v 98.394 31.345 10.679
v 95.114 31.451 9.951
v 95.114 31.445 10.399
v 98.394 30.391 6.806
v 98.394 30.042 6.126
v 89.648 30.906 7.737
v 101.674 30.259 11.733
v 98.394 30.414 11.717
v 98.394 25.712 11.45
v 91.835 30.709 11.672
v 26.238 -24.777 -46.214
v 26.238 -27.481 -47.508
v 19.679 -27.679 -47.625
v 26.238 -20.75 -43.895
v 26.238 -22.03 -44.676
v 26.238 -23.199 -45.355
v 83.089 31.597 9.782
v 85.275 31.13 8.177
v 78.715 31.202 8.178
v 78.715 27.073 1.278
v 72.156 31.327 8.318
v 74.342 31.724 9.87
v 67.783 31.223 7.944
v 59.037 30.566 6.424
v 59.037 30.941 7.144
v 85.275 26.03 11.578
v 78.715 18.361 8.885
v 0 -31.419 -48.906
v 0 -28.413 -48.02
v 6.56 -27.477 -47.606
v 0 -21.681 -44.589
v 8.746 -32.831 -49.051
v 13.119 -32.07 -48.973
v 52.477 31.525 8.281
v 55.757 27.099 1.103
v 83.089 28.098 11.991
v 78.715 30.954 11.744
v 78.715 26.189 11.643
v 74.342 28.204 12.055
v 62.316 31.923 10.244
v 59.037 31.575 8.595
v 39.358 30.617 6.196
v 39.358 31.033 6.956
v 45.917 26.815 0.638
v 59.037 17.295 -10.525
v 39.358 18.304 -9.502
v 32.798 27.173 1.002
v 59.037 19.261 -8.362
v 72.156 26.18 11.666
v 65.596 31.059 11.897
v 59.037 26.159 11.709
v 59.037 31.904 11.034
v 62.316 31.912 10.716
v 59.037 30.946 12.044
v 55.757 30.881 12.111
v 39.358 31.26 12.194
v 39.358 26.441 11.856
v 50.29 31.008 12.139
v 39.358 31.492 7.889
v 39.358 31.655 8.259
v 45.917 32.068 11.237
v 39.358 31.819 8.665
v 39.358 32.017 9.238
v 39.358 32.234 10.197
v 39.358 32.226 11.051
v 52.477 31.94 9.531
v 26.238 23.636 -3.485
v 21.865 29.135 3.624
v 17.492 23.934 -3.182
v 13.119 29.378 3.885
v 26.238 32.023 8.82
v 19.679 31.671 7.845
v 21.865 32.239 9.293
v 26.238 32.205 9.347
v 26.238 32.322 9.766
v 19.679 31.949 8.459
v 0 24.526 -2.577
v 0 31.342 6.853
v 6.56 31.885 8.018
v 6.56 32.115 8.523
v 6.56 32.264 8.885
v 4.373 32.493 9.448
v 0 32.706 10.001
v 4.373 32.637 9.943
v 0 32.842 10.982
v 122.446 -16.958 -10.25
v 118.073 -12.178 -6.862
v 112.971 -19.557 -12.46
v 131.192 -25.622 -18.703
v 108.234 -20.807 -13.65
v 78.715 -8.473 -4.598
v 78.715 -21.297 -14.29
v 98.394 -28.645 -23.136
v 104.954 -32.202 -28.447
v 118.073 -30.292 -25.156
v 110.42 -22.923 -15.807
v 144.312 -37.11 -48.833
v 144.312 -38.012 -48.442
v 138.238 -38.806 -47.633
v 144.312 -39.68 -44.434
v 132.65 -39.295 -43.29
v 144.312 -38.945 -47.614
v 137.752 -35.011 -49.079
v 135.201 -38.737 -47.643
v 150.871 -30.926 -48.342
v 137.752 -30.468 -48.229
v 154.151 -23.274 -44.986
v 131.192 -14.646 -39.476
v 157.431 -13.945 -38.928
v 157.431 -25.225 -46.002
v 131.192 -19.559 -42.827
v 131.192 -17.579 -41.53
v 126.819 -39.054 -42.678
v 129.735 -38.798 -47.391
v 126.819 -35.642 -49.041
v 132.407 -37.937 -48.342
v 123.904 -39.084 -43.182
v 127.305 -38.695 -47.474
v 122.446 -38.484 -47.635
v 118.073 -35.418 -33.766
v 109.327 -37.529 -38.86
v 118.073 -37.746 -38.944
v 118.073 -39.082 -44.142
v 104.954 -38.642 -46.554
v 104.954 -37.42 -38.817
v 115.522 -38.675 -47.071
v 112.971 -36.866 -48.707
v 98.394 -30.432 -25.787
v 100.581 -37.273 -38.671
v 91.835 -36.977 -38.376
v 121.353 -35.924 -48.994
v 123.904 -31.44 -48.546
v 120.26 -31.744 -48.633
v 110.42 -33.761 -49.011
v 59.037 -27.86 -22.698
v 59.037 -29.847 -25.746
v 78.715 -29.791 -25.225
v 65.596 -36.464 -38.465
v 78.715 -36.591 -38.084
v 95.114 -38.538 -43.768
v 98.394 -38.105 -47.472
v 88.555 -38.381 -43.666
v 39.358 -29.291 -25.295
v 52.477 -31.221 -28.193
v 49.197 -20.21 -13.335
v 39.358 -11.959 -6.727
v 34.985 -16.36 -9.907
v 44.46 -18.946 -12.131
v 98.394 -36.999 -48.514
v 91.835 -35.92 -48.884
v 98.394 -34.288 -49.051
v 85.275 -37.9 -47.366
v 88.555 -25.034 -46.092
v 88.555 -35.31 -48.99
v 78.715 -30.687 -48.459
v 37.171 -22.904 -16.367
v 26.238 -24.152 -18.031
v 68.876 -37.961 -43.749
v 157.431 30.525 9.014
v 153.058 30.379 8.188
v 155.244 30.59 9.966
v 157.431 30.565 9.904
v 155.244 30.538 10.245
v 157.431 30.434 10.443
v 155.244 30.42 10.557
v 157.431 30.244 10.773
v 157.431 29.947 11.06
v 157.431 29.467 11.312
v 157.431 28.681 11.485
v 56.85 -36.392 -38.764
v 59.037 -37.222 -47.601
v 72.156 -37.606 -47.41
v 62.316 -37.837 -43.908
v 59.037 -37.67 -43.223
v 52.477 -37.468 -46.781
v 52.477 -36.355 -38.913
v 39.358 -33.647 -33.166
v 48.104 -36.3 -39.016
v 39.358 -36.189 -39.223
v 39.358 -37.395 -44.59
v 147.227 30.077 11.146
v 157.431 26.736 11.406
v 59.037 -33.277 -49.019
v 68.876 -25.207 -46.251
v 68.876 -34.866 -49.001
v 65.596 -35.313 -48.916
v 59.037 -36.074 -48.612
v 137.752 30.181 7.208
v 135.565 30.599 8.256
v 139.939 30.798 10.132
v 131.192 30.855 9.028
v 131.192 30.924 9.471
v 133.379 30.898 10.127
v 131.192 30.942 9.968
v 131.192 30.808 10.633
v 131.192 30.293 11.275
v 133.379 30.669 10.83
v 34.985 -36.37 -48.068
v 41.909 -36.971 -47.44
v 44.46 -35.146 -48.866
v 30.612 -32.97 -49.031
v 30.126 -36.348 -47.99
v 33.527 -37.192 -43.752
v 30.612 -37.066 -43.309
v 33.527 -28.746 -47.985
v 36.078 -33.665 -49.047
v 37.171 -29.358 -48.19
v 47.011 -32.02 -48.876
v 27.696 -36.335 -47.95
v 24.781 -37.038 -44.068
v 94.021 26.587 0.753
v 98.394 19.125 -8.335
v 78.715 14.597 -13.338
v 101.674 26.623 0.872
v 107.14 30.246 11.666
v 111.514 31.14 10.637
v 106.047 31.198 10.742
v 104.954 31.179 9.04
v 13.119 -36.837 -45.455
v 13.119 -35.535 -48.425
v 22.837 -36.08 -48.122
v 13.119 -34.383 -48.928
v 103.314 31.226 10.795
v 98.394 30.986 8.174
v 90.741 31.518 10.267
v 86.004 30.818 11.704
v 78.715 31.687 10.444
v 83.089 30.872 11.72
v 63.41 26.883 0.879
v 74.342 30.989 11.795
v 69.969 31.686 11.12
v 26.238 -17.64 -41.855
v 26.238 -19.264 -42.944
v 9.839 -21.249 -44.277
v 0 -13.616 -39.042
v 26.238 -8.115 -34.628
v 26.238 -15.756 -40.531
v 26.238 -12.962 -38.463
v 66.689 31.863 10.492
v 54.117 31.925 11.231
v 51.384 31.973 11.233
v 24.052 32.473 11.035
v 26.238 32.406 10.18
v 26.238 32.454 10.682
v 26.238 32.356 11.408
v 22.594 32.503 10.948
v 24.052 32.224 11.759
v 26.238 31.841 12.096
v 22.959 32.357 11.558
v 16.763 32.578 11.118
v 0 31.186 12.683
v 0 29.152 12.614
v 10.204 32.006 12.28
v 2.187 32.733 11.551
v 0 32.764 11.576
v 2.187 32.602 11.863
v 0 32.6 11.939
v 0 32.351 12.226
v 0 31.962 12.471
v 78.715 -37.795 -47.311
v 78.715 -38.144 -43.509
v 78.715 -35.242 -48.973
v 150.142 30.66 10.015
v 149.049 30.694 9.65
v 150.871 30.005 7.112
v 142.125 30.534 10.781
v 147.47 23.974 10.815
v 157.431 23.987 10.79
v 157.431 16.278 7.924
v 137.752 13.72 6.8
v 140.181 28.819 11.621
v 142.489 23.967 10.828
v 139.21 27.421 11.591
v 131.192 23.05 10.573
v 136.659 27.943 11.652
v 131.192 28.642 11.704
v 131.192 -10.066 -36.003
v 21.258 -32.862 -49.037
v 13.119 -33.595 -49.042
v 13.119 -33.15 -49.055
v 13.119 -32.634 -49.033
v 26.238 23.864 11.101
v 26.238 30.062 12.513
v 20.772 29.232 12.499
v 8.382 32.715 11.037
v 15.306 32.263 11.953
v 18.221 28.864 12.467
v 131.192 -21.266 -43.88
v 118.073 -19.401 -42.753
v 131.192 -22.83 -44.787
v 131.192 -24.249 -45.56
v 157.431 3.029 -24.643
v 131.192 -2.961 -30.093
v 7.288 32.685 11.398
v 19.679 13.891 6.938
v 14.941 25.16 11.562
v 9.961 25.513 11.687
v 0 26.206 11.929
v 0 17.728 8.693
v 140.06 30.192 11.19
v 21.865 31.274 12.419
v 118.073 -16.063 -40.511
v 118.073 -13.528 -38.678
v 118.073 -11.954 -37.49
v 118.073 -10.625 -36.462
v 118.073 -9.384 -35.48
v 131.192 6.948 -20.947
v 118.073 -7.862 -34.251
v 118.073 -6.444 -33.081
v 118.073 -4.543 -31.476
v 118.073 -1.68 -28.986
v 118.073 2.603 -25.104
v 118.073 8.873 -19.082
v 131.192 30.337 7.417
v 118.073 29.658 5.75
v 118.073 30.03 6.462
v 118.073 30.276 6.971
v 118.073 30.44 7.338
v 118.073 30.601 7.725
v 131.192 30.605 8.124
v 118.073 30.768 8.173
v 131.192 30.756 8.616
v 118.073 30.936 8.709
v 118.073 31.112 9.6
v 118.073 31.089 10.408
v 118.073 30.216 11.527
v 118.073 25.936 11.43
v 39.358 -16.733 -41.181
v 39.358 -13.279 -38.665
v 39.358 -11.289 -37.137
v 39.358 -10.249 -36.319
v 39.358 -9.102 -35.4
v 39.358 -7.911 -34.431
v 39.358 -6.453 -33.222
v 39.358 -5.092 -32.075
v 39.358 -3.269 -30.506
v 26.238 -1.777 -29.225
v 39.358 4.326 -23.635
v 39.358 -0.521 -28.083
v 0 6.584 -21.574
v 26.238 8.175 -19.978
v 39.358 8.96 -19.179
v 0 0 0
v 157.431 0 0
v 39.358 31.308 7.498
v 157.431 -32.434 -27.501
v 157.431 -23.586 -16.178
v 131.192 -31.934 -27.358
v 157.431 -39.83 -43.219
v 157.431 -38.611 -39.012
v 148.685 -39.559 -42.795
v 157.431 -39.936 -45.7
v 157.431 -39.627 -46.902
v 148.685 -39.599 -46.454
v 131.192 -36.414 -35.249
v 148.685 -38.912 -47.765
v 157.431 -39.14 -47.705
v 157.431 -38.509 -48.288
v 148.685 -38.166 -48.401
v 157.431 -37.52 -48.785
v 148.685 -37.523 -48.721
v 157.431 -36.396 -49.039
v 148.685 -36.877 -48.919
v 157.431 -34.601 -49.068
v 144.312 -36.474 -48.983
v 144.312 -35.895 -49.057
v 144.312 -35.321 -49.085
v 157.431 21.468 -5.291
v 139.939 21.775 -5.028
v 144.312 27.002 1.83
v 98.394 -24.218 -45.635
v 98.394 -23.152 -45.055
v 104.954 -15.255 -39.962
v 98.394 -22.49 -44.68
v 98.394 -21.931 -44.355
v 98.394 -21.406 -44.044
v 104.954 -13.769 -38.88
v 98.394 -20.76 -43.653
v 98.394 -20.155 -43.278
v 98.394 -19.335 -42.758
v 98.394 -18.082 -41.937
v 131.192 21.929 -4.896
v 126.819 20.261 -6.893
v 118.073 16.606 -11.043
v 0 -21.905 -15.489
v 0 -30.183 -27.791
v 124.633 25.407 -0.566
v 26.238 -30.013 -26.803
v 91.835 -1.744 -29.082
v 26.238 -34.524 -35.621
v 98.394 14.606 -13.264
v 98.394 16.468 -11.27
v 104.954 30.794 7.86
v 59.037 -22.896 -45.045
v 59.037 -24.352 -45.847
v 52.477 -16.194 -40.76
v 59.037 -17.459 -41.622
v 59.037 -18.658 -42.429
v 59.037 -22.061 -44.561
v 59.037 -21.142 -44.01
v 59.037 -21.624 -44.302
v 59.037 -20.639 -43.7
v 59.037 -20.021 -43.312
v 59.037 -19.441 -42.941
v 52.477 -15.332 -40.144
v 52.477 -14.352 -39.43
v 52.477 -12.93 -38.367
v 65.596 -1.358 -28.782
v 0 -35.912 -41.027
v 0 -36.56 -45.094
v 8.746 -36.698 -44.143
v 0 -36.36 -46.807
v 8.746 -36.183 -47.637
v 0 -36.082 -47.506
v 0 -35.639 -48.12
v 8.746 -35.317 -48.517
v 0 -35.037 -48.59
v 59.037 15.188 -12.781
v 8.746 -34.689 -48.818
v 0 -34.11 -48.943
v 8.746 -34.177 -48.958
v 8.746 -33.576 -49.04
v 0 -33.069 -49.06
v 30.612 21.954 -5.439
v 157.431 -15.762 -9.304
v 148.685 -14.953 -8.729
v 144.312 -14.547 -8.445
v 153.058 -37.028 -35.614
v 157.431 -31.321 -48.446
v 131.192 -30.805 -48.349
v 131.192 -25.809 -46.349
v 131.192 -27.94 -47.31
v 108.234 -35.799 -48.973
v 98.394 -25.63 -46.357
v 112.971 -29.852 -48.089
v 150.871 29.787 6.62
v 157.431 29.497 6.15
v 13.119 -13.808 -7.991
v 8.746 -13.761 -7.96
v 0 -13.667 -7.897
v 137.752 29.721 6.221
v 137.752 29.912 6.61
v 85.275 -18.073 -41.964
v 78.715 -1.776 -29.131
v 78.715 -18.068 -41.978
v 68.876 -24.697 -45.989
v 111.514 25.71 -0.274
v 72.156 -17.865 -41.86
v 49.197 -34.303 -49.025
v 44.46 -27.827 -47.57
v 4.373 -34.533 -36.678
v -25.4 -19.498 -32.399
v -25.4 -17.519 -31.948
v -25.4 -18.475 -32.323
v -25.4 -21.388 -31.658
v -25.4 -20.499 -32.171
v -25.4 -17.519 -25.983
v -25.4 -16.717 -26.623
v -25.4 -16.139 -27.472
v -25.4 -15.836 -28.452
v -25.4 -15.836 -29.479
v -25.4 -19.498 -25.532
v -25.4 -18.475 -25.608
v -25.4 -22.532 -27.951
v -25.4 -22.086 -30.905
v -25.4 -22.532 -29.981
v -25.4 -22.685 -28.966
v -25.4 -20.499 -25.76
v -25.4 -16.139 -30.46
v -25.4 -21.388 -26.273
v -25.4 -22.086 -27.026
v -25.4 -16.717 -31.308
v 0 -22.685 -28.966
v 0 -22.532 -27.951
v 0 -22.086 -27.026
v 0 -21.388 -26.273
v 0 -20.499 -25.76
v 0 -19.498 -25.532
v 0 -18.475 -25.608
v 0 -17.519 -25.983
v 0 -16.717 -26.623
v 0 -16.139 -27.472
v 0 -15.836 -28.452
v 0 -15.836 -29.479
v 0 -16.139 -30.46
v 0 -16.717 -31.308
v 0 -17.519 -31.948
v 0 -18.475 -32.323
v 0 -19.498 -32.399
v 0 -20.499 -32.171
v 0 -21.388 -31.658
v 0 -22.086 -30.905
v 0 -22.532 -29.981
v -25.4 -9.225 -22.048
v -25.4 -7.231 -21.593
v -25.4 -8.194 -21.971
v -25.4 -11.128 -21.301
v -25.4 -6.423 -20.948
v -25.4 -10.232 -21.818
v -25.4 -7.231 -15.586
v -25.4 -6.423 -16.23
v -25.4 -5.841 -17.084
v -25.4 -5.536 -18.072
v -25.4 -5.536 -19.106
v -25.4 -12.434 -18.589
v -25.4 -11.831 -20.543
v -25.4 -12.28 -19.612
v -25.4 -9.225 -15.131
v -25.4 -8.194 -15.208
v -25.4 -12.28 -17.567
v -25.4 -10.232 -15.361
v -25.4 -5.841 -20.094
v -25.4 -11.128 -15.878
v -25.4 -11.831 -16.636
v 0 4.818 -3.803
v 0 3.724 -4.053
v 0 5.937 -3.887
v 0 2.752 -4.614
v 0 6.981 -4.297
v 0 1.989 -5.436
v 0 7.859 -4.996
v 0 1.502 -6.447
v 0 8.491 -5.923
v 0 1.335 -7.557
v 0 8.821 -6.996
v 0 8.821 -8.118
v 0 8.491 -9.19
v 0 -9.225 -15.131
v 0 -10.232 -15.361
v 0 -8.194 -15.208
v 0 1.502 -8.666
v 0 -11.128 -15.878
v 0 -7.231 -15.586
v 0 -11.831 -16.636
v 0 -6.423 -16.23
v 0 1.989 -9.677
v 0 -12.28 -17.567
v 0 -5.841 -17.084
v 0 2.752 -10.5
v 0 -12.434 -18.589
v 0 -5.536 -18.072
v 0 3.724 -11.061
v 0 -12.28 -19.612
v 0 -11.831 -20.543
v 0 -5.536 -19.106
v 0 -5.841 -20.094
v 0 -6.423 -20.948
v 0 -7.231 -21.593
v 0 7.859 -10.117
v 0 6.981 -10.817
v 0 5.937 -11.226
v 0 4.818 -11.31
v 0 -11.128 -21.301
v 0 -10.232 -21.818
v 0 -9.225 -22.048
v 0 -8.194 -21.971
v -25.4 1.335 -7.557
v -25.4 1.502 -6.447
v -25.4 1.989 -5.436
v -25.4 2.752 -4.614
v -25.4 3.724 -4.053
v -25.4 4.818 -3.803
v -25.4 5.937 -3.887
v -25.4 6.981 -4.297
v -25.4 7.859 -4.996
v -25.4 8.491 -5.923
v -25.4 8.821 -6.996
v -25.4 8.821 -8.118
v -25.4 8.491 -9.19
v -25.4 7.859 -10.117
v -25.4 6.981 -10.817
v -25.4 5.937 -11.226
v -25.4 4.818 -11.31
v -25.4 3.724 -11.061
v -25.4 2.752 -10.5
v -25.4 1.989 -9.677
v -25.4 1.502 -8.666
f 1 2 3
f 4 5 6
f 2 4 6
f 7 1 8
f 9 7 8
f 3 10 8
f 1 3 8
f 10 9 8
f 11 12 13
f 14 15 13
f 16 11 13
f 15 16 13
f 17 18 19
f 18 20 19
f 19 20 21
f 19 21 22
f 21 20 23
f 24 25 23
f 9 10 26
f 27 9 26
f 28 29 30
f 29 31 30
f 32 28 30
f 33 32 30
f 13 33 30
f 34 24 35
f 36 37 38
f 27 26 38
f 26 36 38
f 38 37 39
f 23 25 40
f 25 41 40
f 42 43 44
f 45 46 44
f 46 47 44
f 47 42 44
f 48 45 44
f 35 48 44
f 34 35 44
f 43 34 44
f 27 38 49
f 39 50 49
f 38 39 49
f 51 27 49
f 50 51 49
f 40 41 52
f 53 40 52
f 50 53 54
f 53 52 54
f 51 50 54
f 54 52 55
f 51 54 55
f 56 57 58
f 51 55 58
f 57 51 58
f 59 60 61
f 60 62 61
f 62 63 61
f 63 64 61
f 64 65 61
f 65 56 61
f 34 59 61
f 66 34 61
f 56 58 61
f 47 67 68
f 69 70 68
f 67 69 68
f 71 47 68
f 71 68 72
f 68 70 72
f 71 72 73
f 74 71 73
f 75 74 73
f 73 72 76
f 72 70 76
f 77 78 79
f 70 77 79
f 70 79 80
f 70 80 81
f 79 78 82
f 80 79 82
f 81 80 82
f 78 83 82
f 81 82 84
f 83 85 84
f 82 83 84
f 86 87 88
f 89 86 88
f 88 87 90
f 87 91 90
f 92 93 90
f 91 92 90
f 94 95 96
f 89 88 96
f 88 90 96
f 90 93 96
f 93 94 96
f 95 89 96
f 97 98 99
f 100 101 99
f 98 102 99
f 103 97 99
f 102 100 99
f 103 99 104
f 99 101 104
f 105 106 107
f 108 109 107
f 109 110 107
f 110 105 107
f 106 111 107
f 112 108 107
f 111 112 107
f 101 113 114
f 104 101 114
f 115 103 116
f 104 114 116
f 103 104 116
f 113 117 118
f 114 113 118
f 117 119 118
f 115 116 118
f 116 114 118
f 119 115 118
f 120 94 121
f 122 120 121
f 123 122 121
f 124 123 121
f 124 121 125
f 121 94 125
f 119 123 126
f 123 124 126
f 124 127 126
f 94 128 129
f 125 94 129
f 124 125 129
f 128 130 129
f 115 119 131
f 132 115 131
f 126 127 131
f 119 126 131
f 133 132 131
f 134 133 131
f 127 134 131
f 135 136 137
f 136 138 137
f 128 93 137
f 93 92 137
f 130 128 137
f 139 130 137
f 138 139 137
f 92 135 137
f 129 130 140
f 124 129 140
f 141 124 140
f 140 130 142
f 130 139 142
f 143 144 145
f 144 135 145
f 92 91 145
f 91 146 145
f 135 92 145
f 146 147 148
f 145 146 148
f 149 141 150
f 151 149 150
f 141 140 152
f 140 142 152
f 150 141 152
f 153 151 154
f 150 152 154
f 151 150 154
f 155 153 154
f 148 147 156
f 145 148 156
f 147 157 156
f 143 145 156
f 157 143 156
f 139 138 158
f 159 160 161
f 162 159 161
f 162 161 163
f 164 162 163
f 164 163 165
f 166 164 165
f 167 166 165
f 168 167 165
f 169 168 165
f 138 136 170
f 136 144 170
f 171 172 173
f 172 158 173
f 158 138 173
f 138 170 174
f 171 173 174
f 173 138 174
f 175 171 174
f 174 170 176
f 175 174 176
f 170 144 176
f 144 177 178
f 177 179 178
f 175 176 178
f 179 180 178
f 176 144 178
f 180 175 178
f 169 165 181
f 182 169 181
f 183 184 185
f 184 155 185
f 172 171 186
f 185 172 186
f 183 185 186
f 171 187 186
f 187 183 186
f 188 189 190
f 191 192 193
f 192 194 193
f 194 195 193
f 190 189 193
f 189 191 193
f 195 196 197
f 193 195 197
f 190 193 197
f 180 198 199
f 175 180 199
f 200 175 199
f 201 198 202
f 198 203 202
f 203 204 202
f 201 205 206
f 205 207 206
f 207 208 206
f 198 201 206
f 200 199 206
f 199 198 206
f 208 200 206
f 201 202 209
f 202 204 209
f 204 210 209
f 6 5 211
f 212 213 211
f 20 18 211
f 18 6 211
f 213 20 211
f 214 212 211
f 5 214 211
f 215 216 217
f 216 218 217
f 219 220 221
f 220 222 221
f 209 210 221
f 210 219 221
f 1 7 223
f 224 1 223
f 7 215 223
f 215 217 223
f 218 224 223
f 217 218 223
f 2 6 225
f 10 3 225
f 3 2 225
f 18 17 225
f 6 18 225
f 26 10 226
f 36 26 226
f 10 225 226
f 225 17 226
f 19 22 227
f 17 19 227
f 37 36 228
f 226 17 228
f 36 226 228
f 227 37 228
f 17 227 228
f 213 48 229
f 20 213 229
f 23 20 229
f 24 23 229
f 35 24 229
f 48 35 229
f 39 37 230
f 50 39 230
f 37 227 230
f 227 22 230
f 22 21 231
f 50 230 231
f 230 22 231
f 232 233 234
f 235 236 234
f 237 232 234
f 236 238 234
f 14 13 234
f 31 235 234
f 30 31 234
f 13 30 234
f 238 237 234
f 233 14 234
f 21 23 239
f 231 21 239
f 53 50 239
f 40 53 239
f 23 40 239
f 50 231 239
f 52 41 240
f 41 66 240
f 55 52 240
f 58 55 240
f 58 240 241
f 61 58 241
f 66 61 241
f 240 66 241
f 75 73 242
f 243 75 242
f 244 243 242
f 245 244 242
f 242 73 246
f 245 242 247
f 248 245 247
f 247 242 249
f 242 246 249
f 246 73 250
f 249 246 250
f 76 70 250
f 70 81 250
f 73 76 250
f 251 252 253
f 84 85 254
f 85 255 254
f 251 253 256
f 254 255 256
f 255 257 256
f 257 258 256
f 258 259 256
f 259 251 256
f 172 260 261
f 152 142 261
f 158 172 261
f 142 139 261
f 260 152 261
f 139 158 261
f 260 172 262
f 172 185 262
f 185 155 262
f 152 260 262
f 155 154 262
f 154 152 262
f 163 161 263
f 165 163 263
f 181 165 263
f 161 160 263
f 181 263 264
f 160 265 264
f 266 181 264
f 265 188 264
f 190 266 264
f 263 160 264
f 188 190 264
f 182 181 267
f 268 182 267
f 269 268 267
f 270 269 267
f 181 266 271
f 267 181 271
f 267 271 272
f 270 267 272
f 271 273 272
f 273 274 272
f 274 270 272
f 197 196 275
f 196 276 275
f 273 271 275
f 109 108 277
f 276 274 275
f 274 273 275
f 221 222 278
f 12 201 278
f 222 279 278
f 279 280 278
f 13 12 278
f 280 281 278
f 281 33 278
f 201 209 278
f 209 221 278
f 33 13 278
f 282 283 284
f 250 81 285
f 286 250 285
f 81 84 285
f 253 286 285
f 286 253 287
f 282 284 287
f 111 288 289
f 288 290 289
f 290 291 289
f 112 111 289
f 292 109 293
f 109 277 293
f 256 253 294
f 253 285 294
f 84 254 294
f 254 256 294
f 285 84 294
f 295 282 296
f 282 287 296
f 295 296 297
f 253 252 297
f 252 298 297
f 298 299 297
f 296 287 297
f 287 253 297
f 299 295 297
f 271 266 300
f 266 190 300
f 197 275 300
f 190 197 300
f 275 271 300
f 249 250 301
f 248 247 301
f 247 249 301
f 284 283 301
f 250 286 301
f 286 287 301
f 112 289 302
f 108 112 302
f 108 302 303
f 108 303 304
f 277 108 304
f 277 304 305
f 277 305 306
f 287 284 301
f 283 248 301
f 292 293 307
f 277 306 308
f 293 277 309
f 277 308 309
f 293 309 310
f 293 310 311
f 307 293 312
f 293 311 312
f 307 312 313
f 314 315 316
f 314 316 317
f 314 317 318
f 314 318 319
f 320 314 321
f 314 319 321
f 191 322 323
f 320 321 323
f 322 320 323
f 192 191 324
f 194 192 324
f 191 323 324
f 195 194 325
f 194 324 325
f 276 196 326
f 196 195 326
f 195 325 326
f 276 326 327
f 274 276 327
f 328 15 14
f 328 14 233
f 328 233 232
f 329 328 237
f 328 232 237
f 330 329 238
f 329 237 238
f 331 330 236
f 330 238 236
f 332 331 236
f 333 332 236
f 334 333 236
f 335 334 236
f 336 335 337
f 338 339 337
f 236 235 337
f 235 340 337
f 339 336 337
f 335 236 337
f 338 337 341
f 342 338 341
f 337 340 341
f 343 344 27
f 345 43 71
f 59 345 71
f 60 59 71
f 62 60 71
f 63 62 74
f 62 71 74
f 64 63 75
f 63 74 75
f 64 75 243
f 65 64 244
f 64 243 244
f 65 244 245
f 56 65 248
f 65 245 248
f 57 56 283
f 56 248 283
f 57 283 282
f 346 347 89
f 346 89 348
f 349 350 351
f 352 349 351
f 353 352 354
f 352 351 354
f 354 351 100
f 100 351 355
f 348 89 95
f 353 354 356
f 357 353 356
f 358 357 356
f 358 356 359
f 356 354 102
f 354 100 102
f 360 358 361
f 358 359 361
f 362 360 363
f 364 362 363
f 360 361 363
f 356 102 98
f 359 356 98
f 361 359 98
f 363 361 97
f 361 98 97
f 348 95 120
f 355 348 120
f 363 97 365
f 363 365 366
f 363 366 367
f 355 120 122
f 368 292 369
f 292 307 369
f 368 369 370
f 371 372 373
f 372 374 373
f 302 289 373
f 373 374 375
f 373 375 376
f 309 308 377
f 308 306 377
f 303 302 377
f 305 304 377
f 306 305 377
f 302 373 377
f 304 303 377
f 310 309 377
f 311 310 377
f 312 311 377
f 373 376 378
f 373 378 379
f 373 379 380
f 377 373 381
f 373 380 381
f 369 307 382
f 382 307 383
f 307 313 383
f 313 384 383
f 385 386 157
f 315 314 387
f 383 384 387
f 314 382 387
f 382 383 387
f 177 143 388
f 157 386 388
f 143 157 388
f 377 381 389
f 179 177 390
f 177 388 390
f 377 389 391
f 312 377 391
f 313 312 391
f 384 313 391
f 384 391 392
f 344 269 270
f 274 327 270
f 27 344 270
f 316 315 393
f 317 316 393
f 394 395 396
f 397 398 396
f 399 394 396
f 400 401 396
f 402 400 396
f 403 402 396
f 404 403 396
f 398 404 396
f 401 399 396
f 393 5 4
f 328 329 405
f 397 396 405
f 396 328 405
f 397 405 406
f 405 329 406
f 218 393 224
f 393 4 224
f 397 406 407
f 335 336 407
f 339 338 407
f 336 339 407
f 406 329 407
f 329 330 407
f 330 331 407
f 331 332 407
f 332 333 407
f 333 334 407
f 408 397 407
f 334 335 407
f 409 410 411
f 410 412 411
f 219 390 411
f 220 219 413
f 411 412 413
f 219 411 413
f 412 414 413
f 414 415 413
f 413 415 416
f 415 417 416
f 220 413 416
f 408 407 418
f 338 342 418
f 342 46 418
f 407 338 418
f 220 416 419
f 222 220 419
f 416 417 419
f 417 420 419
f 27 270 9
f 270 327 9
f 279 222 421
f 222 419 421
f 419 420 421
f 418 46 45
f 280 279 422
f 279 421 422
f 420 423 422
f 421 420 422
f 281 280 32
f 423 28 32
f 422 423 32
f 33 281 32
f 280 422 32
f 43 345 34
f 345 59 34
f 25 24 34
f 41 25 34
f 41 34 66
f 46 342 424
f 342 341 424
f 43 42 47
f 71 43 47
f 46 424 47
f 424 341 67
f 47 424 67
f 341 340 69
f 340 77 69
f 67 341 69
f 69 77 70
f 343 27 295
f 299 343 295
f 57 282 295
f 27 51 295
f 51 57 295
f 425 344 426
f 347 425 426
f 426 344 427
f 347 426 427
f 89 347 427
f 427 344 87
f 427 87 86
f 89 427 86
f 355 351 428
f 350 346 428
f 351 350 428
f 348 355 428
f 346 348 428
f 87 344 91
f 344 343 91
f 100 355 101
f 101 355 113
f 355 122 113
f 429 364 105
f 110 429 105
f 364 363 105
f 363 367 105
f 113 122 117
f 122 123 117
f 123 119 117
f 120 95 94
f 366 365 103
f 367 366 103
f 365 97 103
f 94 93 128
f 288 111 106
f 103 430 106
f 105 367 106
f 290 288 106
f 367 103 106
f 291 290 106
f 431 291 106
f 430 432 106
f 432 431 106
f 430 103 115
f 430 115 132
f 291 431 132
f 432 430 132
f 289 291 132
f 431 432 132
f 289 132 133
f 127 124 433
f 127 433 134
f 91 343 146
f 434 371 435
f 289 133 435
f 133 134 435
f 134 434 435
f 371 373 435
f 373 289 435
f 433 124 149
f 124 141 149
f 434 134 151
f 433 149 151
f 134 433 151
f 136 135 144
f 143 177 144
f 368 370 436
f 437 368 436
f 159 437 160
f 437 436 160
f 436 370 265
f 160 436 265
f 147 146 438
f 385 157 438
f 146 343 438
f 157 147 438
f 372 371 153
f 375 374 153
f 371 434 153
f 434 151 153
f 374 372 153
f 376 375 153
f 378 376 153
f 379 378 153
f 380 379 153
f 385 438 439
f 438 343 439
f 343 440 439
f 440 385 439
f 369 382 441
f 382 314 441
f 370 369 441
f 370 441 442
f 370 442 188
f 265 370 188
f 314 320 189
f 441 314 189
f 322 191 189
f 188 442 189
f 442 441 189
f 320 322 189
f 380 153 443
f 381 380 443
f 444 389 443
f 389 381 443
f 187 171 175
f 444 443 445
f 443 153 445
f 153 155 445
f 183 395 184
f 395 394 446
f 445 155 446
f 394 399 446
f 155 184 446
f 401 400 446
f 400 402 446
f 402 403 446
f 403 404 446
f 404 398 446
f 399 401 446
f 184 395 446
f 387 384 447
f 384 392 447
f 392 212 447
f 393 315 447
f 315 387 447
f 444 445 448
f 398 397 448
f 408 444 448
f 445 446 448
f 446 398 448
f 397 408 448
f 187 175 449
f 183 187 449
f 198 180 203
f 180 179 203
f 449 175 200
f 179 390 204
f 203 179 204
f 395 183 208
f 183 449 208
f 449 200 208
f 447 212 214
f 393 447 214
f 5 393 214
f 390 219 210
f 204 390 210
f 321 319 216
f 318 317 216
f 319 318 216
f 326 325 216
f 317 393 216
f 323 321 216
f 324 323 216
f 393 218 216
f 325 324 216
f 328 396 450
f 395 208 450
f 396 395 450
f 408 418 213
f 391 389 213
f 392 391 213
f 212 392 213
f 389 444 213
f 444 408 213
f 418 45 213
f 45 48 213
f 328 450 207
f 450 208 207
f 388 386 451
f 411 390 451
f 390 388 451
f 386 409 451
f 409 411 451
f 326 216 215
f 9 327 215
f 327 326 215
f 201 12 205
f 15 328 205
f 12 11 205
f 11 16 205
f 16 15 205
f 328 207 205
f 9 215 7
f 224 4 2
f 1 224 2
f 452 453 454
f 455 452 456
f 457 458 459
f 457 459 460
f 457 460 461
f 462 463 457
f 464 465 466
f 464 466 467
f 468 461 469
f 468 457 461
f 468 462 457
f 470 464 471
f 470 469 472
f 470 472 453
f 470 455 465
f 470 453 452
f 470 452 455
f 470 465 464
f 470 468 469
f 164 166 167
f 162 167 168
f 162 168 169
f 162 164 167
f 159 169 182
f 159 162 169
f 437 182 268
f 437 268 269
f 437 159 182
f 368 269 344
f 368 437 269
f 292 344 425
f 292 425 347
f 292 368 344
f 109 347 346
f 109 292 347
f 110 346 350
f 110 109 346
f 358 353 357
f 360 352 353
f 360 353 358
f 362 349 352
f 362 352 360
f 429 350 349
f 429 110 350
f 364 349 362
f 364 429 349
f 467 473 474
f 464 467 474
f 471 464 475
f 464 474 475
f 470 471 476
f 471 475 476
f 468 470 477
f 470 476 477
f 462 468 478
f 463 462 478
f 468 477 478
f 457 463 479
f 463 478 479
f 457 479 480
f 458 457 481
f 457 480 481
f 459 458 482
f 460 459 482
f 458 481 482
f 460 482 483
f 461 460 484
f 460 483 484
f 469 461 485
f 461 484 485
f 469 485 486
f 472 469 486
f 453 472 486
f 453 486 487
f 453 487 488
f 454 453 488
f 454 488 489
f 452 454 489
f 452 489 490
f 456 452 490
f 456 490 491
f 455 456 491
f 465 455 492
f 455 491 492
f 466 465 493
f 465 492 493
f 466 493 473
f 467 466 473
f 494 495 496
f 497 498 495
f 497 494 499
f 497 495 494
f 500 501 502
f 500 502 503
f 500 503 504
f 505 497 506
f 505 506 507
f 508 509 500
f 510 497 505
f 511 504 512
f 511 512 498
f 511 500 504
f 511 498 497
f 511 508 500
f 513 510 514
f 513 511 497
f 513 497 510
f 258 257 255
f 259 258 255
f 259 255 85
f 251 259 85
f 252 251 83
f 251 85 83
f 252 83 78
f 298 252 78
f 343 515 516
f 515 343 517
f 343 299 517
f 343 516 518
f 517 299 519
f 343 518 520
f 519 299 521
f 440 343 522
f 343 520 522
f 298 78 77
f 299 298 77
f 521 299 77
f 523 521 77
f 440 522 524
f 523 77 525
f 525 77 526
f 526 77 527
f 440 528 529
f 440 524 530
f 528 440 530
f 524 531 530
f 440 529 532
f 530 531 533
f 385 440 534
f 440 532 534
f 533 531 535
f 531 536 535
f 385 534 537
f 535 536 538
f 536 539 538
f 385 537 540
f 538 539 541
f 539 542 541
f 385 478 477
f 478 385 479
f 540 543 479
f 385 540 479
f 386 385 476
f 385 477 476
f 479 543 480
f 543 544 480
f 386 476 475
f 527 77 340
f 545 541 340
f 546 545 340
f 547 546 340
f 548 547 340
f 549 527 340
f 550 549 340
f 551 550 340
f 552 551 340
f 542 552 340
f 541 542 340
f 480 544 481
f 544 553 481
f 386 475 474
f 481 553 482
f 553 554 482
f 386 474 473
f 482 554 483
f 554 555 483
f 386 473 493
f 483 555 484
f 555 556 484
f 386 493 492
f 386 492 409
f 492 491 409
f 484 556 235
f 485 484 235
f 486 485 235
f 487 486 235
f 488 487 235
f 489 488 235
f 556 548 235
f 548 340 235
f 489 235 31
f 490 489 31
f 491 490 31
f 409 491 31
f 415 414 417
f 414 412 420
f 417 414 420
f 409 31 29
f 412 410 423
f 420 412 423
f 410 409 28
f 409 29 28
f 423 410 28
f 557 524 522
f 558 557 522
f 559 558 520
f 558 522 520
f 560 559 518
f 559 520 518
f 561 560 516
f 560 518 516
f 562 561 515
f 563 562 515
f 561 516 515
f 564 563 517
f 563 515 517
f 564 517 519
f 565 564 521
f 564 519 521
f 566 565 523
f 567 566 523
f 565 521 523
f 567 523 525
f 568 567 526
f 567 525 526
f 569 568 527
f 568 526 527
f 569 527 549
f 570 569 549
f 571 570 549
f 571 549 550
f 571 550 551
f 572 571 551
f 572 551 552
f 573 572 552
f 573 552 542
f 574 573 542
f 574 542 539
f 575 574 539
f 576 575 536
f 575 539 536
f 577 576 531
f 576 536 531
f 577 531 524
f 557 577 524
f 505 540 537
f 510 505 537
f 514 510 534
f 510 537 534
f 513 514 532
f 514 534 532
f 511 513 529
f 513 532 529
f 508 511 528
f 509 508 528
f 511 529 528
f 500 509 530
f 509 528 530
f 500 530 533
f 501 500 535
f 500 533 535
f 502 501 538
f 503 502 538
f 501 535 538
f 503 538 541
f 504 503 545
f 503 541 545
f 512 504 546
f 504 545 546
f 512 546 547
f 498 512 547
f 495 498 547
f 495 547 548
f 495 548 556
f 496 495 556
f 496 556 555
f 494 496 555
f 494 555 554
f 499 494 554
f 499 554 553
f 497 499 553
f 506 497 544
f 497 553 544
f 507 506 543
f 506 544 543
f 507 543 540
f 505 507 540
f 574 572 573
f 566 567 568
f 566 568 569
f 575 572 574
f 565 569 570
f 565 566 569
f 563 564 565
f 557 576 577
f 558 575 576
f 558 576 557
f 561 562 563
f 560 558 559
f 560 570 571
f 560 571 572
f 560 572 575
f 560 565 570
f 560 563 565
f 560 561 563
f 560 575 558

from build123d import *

# Parameters (mm, degrees)
F4_R     = 3.7642677445
F4_R_2   = 3.4683059597
F4_R_3   = 3.4434090322
F5_DEPTH = 25.4


with BuildPart() as f3:
    # F2 (on offset) → F3 section 0
    with BuildSketch(Plane.YZ.offset(157.4308425188)):
        with BuildLine():
            add(Edge.make_bspline(
                [(0, 0), (-12.104644098, -6.3263168889), (-25.8820610041, -14.6136318994), (-47.8781855597, -52.5526708502), (-15.1609022465, -47.143178944), (53.8601710207, 26.7993739174), (11.9120155475, 6.2256423674), (0, 0)],
                knots=[0, 0, 0, 0, 0.1920446361, 0.3741659284, 0.5277277836, 0.8110114868, 1, 1, 1, 1], degree=3))
        make_face()
    # F0 (on Right) → F3 section 1
    with BuildSketch(Plane.YZ):
        with BuildLine():
            add(Edge.make_bspline(
                [(0, 0), (-11.4863605542, -5.9808116248), (-23.7079853047, -12.9240739578), (-43.9479848114, -53.9035395464), (-13.4752914458, -44.6437869025), (57.5158608034, 29.1418474769), (12.2926695837, 6.4006471675), (0, 0)],
                knots=[0, 0, 0, 0, 0.1834861231, 0.3694876095, 0.5199065669, 0.8036336859, 1, 1, 1, 1], degree=3))
        make_face()
    loft()

    # F4 (on face) → F5 (join)
    with BuildSketch(Plane(origin=(0, 0, 0), x_dir=(0, -1, 0), z_dir=(-1, 0, 0))):
        with Locations((-5.0992490724, -7.5565879233)):
            Circle(F4_R)
        with Locations((8.9653758332, -18.5892935842)):
            Circle(F4_R_2)
        with Locations((19.241169095, -28.9655476809)):
            Circle(F4_R_3)
    extrude(amount=F5_DEPTH)


solid = f3.part
